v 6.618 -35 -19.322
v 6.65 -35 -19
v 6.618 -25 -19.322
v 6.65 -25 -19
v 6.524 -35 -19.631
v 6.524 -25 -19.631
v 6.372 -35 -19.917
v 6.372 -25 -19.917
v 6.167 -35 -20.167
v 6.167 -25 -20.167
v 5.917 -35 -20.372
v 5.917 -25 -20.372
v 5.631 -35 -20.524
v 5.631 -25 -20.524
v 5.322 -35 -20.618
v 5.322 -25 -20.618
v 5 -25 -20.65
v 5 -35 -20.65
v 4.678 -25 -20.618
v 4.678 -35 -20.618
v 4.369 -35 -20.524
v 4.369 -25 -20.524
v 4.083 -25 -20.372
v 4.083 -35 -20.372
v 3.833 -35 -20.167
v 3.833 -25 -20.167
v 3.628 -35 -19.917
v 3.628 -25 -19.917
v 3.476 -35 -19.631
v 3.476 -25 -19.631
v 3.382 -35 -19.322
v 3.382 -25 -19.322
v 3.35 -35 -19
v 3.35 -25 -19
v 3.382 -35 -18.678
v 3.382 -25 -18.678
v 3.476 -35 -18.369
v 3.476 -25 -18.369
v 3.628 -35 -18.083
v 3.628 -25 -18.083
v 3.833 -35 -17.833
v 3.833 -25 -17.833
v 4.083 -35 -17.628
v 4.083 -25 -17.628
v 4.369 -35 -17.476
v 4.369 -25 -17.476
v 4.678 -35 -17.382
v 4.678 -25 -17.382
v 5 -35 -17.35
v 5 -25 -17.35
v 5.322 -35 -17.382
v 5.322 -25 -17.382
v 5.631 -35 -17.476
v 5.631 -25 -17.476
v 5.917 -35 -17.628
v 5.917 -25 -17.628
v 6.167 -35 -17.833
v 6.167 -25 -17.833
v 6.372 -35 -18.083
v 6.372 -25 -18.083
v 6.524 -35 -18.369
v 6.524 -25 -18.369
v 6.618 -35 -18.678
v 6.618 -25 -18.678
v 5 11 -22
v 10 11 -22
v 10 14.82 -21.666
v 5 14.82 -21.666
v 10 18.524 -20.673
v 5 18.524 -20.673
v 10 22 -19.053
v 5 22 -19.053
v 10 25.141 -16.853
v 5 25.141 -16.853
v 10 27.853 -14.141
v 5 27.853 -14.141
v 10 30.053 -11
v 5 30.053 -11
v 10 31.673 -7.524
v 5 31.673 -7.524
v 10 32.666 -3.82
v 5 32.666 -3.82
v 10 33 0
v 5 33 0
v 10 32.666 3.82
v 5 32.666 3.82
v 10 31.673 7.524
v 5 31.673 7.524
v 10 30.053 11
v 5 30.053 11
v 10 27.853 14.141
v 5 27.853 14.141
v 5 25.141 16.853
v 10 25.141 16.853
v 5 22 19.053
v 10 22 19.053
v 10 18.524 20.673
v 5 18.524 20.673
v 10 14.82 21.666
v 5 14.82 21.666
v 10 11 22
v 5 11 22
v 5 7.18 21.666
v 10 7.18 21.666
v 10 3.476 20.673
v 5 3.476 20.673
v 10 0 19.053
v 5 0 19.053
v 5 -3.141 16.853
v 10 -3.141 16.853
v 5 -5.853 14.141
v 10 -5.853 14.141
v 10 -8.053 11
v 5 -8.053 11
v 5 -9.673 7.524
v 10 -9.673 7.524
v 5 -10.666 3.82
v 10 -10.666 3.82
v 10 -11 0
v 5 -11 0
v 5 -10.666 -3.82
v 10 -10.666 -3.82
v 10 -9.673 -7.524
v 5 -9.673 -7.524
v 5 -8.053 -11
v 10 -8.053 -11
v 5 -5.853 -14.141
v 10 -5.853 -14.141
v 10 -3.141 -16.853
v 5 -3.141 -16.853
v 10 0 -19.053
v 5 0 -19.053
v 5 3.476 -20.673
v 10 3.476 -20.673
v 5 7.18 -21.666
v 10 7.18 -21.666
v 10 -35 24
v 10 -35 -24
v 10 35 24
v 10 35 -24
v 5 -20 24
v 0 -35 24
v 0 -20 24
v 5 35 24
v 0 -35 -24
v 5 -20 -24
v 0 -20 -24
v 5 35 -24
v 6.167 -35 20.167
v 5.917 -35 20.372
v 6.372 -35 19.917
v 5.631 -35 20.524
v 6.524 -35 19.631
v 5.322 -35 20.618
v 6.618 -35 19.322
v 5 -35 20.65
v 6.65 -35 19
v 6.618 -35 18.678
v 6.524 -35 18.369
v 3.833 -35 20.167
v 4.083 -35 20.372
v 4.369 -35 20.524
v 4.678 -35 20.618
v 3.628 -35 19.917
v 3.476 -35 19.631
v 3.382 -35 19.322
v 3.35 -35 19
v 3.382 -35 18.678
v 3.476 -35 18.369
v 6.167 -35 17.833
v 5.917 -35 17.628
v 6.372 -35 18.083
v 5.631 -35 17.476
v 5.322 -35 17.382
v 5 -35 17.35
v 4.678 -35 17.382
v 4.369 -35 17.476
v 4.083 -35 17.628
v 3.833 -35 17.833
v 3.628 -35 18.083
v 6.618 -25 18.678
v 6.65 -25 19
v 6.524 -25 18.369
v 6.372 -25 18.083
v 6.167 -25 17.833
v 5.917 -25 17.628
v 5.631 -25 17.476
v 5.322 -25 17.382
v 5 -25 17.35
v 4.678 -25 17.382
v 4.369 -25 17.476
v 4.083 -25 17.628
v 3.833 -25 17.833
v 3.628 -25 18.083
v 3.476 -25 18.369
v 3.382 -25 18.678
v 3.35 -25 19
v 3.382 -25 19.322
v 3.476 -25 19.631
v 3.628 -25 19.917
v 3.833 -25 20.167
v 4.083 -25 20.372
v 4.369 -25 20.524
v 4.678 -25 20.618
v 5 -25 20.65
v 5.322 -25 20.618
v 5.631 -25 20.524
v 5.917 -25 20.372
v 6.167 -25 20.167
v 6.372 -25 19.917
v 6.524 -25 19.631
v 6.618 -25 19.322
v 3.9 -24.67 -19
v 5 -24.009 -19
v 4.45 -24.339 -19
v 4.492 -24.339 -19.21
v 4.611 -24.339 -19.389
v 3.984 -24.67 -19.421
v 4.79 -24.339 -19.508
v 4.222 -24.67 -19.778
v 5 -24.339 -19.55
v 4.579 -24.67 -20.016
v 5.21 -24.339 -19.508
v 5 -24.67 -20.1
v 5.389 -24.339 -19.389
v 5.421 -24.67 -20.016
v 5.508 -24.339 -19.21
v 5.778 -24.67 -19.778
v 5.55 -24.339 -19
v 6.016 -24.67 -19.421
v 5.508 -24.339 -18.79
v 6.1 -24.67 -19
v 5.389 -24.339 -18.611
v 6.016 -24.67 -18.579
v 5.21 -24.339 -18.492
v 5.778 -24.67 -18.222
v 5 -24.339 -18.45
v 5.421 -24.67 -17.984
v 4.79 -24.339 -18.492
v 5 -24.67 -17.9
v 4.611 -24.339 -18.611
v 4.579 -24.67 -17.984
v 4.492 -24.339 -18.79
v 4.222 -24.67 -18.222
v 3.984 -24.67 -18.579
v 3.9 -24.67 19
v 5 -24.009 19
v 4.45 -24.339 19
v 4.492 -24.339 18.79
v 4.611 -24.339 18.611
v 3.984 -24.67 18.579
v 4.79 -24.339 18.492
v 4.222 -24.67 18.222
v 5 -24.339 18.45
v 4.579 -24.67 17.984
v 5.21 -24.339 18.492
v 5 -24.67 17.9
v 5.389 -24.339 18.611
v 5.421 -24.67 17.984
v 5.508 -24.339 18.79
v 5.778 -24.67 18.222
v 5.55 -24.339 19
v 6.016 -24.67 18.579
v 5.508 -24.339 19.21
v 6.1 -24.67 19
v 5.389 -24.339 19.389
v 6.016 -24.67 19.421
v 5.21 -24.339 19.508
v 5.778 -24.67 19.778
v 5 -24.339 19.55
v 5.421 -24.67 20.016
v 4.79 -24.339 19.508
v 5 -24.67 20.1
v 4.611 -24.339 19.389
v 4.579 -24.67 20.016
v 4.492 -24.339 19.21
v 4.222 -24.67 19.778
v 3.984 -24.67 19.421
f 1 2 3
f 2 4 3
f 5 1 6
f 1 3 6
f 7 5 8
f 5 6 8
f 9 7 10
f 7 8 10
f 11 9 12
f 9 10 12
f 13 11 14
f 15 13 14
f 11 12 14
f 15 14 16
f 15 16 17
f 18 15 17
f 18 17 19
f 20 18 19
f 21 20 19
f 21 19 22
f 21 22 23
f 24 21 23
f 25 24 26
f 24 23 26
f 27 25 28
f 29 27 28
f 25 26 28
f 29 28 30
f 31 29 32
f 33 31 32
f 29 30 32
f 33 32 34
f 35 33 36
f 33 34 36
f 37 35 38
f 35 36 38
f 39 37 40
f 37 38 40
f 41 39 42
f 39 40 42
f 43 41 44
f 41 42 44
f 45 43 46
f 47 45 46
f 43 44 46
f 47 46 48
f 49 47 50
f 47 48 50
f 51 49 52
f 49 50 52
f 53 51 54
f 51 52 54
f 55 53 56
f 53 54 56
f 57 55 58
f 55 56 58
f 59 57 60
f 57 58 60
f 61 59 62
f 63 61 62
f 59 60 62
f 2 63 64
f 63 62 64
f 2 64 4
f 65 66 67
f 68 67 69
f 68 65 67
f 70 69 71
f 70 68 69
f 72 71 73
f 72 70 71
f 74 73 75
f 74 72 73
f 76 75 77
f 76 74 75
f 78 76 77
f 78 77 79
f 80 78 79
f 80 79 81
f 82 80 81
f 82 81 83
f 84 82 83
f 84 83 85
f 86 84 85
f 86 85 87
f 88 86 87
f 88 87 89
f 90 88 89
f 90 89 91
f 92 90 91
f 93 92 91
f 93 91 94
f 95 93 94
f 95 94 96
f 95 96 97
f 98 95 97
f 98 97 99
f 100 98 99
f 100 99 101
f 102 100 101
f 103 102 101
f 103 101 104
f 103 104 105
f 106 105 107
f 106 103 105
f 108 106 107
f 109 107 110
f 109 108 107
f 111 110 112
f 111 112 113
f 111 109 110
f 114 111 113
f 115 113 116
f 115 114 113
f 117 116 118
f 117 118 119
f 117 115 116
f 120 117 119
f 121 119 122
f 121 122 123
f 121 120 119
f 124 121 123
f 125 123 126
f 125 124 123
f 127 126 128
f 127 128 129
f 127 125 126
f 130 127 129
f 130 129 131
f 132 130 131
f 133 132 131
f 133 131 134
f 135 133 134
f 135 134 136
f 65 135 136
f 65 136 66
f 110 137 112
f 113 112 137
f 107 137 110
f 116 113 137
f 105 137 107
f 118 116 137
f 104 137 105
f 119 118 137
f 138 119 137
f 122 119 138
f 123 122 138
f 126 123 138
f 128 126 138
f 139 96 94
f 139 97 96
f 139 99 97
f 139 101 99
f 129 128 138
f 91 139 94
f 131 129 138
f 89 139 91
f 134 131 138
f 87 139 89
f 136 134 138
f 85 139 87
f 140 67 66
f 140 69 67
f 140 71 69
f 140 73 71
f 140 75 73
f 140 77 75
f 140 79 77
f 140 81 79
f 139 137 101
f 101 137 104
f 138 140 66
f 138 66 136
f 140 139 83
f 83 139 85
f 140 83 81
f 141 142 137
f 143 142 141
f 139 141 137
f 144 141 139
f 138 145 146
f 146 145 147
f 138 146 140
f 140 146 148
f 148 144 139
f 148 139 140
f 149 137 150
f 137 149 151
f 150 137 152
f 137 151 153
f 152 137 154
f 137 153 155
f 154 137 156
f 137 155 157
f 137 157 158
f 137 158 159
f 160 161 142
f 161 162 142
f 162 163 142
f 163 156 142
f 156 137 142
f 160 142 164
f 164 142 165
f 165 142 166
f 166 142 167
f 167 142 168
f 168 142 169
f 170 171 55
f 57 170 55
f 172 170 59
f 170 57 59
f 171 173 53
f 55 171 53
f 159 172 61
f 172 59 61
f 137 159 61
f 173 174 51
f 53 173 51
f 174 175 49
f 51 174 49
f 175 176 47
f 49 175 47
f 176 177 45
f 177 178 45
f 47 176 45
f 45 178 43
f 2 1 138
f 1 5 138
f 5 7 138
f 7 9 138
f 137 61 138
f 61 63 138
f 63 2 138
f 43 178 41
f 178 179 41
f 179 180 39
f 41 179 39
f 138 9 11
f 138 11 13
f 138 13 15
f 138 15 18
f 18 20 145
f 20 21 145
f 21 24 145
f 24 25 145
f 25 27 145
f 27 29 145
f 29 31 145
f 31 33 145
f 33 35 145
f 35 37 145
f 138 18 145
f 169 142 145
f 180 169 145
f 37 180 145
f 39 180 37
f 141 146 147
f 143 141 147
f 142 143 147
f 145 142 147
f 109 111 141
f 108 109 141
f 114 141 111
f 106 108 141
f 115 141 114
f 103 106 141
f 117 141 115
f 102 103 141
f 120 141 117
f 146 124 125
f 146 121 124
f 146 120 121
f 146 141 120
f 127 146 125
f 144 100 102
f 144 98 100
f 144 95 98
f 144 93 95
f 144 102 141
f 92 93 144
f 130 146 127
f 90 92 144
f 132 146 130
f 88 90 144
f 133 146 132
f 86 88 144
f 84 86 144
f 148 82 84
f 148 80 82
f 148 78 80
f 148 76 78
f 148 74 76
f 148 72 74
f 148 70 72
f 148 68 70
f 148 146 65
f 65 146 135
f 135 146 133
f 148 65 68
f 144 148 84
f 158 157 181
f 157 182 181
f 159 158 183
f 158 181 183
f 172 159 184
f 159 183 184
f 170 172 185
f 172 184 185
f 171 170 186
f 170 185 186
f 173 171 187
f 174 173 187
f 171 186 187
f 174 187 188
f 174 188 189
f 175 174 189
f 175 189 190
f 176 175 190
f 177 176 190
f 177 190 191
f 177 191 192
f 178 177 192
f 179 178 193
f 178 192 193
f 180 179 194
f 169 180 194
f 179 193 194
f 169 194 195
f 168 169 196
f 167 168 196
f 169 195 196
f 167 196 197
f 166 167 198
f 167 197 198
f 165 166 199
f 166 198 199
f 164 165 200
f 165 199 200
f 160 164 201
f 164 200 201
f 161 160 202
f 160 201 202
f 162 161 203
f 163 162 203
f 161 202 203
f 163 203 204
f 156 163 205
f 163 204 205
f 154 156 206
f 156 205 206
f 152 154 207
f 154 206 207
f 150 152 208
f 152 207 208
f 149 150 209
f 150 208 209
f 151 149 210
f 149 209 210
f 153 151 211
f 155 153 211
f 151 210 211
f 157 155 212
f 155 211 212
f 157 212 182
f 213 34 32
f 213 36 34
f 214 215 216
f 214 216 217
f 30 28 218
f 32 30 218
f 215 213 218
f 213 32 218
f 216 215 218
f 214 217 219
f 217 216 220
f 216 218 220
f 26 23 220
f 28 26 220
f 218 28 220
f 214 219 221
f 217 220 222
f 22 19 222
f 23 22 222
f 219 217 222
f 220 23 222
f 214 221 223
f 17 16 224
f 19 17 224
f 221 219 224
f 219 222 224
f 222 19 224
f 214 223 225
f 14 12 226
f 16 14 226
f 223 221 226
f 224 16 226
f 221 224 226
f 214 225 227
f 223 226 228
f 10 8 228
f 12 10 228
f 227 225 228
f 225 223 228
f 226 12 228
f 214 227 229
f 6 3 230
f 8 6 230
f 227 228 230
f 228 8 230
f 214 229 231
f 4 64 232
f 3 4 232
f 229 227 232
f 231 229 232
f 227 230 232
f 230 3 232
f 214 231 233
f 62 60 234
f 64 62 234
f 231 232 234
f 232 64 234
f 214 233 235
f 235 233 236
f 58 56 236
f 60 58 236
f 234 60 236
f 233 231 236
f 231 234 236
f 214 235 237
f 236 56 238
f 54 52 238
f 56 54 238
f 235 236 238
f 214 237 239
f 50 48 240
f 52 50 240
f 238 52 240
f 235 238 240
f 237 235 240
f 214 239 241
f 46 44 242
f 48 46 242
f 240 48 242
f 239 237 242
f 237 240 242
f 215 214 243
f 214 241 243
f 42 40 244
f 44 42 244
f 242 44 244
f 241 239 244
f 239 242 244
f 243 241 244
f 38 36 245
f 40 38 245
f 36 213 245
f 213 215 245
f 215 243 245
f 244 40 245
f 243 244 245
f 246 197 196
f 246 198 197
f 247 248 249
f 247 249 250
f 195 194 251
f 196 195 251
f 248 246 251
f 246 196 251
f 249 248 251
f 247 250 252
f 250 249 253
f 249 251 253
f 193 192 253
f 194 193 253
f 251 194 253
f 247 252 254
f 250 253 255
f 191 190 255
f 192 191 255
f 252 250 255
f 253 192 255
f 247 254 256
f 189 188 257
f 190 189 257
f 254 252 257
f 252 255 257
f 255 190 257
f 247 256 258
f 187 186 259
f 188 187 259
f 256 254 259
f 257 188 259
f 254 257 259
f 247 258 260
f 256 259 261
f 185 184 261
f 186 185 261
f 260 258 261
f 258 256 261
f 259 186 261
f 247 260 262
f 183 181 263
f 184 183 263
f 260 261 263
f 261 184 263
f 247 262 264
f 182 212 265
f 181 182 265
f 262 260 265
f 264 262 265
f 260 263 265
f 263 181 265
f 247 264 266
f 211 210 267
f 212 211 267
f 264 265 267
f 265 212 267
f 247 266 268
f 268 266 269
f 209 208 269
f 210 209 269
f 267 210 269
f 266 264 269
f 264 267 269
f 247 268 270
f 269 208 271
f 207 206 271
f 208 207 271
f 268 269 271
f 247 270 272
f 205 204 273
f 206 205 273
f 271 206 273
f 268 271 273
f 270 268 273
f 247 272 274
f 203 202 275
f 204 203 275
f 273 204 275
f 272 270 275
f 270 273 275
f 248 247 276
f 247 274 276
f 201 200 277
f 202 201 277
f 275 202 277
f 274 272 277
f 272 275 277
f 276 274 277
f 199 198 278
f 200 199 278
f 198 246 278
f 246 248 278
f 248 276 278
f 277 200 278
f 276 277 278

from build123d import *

# Parameters (mm, degrees)
SKETCH4_W                       = 48
SKETCH4_H                       = 70
SKETCH4_R                       = 22
BOSS_EXTRUDE2_DEPTH             = 10
SKETCH5_W                       = 5
SKETCH5_H                       = 55
CUT_EXTRUDE1_DEPTH              = 61.241181927
TAP_DRILL_FOR_M4X0_7_TAP1_D     = 3.3
TAP_DRILL_FOR_M4X0_7_TAP1_DEPTH = 10
TAP_DRILL_FOR_M4X0_7_TAP1_TIP   = 0.991420021


with BuildPart() as part:
    # Sketch4 → Boss-Extrude2 (new body)
    with BuildSketch(Plane(origin=(0, 0, 0), x_dir=(0, 0, -1), z_dir=(1, 0, 0))):
        Rectangle(SKETCH4_W, SKETCH4_H)
        with Locations((0, 11)):
            Circle(SKETCH4_R, mode=Mode.SUBTRACT)
    extrude(amount=BOSS_EXTRUDE2_DEPTH)

    # Sketch5 → Cut-Extrude1 (cut, through all)
    with BuildSketch(Plane(origin=(0, 0, -24), x_dir=(-1, 0, 0), z_dir=(0, 0, -1))):
        with Locations((-2.5, 7.5)):
            Rectangle(SKETCH5_W, SKETCH5_H)
    extrude(amount=-CUT_EXTRUDE1_DEPTH, mode=Mode.SUBTRACT)

    # Tap Drill for M4x0.7 Tap1
    with Locations(Plane(origin=(0, -35, 0), x_dir=(-1, 0, 0), z_dir=(0, -1, 0))):
        with Locations((-5, 19), (-5, -19)):
            Hole(TAP_DRILL_FOR_M4X0_7_TAP1_D / 2, depth=TAP_DRILL_FOR_M4X0_7_TAP1_DEPTH)
            with Locations((0, 0, -(TAP_DRILL_FOR_M4X0_7_TAP1_DEPTH + TAP_DRILL_FOR_M4X0_7_TAP1_TIP / 2))):  # 118° drill point
                Cone(0, TAP_DRILL_FOR_M4X0_7_TAP1_D / 2, TAP_DRILL_FOR_M4X0_7_TAP1_TIP, mode=Mode.SUBTRACT)


solid = part.part
